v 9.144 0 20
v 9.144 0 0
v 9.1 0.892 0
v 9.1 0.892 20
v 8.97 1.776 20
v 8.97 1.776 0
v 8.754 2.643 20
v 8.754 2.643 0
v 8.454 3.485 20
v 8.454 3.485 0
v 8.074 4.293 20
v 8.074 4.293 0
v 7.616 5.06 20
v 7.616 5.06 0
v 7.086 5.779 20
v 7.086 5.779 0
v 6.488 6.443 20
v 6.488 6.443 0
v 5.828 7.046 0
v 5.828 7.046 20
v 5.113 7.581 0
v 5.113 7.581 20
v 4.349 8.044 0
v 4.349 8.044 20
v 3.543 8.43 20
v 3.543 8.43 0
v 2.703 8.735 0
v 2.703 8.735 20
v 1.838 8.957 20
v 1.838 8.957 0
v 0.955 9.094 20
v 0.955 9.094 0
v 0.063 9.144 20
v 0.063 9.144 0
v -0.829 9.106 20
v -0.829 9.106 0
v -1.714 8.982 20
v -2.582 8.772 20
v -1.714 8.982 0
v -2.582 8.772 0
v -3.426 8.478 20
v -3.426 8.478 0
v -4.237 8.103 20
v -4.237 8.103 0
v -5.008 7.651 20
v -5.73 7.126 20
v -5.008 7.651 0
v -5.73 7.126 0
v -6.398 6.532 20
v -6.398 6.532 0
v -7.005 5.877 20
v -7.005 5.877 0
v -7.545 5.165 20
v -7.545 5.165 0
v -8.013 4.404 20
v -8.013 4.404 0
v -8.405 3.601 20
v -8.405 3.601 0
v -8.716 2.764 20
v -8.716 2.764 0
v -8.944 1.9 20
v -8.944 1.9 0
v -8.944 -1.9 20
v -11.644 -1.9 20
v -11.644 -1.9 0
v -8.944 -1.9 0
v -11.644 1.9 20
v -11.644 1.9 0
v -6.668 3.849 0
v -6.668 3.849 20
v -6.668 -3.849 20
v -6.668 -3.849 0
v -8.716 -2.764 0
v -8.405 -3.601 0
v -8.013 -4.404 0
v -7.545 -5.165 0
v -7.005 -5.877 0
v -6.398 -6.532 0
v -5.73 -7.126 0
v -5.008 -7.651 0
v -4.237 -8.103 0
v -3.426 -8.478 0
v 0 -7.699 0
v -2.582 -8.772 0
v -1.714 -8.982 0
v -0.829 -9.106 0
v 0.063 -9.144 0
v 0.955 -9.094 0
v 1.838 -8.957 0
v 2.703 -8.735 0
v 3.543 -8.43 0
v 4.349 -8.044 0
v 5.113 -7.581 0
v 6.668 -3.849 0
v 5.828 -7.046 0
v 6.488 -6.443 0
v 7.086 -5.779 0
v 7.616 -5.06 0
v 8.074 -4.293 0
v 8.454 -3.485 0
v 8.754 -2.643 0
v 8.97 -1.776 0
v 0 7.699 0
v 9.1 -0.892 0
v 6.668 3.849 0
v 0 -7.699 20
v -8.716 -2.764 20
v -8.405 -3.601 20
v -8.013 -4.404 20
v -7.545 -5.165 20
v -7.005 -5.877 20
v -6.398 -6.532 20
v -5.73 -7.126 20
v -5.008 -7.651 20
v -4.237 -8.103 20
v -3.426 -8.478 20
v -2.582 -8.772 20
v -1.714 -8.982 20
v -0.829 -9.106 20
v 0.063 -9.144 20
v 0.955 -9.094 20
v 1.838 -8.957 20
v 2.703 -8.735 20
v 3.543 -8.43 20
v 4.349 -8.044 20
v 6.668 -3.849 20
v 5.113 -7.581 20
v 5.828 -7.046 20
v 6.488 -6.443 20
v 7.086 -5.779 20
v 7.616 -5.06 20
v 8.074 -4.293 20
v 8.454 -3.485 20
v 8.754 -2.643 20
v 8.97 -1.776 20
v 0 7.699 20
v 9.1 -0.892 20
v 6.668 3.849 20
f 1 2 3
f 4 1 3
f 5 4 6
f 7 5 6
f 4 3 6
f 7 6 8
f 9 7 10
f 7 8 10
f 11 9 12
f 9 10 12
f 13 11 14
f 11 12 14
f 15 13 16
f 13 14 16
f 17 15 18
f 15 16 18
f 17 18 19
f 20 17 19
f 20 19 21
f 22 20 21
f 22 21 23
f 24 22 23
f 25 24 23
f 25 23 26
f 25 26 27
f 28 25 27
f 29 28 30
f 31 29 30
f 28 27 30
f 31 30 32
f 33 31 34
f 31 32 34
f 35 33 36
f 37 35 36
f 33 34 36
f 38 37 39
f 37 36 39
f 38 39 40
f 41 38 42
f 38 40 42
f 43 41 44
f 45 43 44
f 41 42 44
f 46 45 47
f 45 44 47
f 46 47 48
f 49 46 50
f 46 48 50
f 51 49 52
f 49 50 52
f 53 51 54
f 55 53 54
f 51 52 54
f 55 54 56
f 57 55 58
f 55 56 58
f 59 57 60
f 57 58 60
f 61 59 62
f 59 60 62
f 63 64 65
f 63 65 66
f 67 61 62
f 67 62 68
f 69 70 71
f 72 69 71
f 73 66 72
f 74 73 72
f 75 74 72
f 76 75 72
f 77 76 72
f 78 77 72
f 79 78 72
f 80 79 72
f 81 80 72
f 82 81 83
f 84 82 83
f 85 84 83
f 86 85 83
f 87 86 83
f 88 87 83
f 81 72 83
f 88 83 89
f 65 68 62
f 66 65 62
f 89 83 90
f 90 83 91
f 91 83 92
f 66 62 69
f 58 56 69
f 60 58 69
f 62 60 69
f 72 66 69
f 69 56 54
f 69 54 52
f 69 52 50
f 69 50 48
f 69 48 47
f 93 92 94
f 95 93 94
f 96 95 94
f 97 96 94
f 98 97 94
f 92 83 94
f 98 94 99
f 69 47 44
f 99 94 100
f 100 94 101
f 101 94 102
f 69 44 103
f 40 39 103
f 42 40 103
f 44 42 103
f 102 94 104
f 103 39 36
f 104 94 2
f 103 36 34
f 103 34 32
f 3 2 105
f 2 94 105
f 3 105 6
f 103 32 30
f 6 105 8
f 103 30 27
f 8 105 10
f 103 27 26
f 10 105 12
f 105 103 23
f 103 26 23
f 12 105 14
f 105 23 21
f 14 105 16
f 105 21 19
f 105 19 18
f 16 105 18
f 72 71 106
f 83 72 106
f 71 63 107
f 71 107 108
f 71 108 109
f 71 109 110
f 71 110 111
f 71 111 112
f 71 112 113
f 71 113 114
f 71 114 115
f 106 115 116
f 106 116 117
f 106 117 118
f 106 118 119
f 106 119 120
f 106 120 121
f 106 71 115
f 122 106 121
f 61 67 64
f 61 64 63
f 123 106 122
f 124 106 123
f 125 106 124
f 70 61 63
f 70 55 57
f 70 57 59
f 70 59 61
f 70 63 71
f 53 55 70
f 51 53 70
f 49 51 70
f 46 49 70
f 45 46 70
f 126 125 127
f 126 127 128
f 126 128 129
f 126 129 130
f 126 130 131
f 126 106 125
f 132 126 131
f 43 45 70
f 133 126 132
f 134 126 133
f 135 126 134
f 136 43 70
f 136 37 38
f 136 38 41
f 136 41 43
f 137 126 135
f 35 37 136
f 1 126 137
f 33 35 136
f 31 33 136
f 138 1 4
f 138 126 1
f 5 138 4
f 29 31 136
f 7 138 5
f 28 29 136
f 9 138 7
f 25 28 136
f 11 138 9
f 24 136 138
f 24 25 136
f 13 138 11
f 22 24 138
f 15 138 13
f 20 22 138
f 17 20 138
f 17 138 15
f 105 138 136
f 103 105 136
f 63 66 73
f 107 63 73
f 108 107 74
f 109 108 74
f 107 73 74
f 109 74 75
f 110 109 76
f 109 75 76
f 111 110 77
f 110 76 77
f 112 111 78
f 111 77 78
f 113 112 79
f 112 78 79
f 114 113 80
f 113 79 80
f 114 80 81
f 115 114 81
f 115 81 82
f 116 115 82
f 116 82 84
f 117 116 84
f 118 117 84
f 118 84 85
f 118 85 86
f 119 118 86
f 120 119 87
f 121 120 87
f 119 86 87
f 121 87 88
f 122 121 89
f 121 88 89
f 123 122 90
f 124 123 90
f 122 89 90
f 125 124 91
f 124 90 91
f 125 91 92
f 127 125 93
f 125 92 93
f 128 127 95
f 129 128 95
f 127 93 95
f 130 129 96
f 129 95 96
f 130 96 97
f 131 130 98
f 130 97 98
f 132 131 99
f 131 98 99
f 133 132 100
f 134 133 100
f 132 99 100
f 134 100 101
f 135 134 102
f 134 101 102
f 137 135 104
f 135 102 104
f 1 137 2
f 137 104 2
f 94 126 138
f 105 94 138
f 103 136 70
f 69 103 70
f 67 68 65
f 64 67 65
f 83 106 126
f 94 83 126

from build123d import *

# Parameters (mm, degrees)
F1_DEPTH = 20
F3_DEPTH = 20


with BuildPart() as f1:
    # F0 (on Top) → F1 (new body)
    with BuildSketch(Plane.XY):
        with BuildLine():
            ThreePointArc((-8.944425, -1.9), (0.955226, -9.093969), (9.144, 0))
            ThreePointArc((9.144, 0), (0.955226, 9.093969), (-8.944425, 1.9))
            ThreePointArc((-8.944425, 1.9), (-9.144, 0), (-8.944425, -1.9))
        make_face()
        with BuildLine():
            ThreePointArc((-8.944425, -1.9), (-9.144, 0), (-8.944425, 1.9))
            Line((-8.944425, 1.9), (-11.644, 1.9))
            Line((-11.644, 1.9), (-11.644, -1.9))
            Line((-11.644, -1.9), (-8.944425, -1.9))
        make_face()
    extrude(amount=F1_DEPTH)

    # F2 (on face) → F3 (cut, through all)
    with BuildSketch(Plane.XY.offset(20)):
        Polygon((6.6675, -3.849483), (6.6675, 3.849483), (0, 7.698966), (-6.6675, 3.849483), (-6.6675, -3.849483), (0, -7.698966), align=None)
    extrude(amount=-F3_DEPTH, mode=Mode.SUBTRACT)


solid = f1.part
